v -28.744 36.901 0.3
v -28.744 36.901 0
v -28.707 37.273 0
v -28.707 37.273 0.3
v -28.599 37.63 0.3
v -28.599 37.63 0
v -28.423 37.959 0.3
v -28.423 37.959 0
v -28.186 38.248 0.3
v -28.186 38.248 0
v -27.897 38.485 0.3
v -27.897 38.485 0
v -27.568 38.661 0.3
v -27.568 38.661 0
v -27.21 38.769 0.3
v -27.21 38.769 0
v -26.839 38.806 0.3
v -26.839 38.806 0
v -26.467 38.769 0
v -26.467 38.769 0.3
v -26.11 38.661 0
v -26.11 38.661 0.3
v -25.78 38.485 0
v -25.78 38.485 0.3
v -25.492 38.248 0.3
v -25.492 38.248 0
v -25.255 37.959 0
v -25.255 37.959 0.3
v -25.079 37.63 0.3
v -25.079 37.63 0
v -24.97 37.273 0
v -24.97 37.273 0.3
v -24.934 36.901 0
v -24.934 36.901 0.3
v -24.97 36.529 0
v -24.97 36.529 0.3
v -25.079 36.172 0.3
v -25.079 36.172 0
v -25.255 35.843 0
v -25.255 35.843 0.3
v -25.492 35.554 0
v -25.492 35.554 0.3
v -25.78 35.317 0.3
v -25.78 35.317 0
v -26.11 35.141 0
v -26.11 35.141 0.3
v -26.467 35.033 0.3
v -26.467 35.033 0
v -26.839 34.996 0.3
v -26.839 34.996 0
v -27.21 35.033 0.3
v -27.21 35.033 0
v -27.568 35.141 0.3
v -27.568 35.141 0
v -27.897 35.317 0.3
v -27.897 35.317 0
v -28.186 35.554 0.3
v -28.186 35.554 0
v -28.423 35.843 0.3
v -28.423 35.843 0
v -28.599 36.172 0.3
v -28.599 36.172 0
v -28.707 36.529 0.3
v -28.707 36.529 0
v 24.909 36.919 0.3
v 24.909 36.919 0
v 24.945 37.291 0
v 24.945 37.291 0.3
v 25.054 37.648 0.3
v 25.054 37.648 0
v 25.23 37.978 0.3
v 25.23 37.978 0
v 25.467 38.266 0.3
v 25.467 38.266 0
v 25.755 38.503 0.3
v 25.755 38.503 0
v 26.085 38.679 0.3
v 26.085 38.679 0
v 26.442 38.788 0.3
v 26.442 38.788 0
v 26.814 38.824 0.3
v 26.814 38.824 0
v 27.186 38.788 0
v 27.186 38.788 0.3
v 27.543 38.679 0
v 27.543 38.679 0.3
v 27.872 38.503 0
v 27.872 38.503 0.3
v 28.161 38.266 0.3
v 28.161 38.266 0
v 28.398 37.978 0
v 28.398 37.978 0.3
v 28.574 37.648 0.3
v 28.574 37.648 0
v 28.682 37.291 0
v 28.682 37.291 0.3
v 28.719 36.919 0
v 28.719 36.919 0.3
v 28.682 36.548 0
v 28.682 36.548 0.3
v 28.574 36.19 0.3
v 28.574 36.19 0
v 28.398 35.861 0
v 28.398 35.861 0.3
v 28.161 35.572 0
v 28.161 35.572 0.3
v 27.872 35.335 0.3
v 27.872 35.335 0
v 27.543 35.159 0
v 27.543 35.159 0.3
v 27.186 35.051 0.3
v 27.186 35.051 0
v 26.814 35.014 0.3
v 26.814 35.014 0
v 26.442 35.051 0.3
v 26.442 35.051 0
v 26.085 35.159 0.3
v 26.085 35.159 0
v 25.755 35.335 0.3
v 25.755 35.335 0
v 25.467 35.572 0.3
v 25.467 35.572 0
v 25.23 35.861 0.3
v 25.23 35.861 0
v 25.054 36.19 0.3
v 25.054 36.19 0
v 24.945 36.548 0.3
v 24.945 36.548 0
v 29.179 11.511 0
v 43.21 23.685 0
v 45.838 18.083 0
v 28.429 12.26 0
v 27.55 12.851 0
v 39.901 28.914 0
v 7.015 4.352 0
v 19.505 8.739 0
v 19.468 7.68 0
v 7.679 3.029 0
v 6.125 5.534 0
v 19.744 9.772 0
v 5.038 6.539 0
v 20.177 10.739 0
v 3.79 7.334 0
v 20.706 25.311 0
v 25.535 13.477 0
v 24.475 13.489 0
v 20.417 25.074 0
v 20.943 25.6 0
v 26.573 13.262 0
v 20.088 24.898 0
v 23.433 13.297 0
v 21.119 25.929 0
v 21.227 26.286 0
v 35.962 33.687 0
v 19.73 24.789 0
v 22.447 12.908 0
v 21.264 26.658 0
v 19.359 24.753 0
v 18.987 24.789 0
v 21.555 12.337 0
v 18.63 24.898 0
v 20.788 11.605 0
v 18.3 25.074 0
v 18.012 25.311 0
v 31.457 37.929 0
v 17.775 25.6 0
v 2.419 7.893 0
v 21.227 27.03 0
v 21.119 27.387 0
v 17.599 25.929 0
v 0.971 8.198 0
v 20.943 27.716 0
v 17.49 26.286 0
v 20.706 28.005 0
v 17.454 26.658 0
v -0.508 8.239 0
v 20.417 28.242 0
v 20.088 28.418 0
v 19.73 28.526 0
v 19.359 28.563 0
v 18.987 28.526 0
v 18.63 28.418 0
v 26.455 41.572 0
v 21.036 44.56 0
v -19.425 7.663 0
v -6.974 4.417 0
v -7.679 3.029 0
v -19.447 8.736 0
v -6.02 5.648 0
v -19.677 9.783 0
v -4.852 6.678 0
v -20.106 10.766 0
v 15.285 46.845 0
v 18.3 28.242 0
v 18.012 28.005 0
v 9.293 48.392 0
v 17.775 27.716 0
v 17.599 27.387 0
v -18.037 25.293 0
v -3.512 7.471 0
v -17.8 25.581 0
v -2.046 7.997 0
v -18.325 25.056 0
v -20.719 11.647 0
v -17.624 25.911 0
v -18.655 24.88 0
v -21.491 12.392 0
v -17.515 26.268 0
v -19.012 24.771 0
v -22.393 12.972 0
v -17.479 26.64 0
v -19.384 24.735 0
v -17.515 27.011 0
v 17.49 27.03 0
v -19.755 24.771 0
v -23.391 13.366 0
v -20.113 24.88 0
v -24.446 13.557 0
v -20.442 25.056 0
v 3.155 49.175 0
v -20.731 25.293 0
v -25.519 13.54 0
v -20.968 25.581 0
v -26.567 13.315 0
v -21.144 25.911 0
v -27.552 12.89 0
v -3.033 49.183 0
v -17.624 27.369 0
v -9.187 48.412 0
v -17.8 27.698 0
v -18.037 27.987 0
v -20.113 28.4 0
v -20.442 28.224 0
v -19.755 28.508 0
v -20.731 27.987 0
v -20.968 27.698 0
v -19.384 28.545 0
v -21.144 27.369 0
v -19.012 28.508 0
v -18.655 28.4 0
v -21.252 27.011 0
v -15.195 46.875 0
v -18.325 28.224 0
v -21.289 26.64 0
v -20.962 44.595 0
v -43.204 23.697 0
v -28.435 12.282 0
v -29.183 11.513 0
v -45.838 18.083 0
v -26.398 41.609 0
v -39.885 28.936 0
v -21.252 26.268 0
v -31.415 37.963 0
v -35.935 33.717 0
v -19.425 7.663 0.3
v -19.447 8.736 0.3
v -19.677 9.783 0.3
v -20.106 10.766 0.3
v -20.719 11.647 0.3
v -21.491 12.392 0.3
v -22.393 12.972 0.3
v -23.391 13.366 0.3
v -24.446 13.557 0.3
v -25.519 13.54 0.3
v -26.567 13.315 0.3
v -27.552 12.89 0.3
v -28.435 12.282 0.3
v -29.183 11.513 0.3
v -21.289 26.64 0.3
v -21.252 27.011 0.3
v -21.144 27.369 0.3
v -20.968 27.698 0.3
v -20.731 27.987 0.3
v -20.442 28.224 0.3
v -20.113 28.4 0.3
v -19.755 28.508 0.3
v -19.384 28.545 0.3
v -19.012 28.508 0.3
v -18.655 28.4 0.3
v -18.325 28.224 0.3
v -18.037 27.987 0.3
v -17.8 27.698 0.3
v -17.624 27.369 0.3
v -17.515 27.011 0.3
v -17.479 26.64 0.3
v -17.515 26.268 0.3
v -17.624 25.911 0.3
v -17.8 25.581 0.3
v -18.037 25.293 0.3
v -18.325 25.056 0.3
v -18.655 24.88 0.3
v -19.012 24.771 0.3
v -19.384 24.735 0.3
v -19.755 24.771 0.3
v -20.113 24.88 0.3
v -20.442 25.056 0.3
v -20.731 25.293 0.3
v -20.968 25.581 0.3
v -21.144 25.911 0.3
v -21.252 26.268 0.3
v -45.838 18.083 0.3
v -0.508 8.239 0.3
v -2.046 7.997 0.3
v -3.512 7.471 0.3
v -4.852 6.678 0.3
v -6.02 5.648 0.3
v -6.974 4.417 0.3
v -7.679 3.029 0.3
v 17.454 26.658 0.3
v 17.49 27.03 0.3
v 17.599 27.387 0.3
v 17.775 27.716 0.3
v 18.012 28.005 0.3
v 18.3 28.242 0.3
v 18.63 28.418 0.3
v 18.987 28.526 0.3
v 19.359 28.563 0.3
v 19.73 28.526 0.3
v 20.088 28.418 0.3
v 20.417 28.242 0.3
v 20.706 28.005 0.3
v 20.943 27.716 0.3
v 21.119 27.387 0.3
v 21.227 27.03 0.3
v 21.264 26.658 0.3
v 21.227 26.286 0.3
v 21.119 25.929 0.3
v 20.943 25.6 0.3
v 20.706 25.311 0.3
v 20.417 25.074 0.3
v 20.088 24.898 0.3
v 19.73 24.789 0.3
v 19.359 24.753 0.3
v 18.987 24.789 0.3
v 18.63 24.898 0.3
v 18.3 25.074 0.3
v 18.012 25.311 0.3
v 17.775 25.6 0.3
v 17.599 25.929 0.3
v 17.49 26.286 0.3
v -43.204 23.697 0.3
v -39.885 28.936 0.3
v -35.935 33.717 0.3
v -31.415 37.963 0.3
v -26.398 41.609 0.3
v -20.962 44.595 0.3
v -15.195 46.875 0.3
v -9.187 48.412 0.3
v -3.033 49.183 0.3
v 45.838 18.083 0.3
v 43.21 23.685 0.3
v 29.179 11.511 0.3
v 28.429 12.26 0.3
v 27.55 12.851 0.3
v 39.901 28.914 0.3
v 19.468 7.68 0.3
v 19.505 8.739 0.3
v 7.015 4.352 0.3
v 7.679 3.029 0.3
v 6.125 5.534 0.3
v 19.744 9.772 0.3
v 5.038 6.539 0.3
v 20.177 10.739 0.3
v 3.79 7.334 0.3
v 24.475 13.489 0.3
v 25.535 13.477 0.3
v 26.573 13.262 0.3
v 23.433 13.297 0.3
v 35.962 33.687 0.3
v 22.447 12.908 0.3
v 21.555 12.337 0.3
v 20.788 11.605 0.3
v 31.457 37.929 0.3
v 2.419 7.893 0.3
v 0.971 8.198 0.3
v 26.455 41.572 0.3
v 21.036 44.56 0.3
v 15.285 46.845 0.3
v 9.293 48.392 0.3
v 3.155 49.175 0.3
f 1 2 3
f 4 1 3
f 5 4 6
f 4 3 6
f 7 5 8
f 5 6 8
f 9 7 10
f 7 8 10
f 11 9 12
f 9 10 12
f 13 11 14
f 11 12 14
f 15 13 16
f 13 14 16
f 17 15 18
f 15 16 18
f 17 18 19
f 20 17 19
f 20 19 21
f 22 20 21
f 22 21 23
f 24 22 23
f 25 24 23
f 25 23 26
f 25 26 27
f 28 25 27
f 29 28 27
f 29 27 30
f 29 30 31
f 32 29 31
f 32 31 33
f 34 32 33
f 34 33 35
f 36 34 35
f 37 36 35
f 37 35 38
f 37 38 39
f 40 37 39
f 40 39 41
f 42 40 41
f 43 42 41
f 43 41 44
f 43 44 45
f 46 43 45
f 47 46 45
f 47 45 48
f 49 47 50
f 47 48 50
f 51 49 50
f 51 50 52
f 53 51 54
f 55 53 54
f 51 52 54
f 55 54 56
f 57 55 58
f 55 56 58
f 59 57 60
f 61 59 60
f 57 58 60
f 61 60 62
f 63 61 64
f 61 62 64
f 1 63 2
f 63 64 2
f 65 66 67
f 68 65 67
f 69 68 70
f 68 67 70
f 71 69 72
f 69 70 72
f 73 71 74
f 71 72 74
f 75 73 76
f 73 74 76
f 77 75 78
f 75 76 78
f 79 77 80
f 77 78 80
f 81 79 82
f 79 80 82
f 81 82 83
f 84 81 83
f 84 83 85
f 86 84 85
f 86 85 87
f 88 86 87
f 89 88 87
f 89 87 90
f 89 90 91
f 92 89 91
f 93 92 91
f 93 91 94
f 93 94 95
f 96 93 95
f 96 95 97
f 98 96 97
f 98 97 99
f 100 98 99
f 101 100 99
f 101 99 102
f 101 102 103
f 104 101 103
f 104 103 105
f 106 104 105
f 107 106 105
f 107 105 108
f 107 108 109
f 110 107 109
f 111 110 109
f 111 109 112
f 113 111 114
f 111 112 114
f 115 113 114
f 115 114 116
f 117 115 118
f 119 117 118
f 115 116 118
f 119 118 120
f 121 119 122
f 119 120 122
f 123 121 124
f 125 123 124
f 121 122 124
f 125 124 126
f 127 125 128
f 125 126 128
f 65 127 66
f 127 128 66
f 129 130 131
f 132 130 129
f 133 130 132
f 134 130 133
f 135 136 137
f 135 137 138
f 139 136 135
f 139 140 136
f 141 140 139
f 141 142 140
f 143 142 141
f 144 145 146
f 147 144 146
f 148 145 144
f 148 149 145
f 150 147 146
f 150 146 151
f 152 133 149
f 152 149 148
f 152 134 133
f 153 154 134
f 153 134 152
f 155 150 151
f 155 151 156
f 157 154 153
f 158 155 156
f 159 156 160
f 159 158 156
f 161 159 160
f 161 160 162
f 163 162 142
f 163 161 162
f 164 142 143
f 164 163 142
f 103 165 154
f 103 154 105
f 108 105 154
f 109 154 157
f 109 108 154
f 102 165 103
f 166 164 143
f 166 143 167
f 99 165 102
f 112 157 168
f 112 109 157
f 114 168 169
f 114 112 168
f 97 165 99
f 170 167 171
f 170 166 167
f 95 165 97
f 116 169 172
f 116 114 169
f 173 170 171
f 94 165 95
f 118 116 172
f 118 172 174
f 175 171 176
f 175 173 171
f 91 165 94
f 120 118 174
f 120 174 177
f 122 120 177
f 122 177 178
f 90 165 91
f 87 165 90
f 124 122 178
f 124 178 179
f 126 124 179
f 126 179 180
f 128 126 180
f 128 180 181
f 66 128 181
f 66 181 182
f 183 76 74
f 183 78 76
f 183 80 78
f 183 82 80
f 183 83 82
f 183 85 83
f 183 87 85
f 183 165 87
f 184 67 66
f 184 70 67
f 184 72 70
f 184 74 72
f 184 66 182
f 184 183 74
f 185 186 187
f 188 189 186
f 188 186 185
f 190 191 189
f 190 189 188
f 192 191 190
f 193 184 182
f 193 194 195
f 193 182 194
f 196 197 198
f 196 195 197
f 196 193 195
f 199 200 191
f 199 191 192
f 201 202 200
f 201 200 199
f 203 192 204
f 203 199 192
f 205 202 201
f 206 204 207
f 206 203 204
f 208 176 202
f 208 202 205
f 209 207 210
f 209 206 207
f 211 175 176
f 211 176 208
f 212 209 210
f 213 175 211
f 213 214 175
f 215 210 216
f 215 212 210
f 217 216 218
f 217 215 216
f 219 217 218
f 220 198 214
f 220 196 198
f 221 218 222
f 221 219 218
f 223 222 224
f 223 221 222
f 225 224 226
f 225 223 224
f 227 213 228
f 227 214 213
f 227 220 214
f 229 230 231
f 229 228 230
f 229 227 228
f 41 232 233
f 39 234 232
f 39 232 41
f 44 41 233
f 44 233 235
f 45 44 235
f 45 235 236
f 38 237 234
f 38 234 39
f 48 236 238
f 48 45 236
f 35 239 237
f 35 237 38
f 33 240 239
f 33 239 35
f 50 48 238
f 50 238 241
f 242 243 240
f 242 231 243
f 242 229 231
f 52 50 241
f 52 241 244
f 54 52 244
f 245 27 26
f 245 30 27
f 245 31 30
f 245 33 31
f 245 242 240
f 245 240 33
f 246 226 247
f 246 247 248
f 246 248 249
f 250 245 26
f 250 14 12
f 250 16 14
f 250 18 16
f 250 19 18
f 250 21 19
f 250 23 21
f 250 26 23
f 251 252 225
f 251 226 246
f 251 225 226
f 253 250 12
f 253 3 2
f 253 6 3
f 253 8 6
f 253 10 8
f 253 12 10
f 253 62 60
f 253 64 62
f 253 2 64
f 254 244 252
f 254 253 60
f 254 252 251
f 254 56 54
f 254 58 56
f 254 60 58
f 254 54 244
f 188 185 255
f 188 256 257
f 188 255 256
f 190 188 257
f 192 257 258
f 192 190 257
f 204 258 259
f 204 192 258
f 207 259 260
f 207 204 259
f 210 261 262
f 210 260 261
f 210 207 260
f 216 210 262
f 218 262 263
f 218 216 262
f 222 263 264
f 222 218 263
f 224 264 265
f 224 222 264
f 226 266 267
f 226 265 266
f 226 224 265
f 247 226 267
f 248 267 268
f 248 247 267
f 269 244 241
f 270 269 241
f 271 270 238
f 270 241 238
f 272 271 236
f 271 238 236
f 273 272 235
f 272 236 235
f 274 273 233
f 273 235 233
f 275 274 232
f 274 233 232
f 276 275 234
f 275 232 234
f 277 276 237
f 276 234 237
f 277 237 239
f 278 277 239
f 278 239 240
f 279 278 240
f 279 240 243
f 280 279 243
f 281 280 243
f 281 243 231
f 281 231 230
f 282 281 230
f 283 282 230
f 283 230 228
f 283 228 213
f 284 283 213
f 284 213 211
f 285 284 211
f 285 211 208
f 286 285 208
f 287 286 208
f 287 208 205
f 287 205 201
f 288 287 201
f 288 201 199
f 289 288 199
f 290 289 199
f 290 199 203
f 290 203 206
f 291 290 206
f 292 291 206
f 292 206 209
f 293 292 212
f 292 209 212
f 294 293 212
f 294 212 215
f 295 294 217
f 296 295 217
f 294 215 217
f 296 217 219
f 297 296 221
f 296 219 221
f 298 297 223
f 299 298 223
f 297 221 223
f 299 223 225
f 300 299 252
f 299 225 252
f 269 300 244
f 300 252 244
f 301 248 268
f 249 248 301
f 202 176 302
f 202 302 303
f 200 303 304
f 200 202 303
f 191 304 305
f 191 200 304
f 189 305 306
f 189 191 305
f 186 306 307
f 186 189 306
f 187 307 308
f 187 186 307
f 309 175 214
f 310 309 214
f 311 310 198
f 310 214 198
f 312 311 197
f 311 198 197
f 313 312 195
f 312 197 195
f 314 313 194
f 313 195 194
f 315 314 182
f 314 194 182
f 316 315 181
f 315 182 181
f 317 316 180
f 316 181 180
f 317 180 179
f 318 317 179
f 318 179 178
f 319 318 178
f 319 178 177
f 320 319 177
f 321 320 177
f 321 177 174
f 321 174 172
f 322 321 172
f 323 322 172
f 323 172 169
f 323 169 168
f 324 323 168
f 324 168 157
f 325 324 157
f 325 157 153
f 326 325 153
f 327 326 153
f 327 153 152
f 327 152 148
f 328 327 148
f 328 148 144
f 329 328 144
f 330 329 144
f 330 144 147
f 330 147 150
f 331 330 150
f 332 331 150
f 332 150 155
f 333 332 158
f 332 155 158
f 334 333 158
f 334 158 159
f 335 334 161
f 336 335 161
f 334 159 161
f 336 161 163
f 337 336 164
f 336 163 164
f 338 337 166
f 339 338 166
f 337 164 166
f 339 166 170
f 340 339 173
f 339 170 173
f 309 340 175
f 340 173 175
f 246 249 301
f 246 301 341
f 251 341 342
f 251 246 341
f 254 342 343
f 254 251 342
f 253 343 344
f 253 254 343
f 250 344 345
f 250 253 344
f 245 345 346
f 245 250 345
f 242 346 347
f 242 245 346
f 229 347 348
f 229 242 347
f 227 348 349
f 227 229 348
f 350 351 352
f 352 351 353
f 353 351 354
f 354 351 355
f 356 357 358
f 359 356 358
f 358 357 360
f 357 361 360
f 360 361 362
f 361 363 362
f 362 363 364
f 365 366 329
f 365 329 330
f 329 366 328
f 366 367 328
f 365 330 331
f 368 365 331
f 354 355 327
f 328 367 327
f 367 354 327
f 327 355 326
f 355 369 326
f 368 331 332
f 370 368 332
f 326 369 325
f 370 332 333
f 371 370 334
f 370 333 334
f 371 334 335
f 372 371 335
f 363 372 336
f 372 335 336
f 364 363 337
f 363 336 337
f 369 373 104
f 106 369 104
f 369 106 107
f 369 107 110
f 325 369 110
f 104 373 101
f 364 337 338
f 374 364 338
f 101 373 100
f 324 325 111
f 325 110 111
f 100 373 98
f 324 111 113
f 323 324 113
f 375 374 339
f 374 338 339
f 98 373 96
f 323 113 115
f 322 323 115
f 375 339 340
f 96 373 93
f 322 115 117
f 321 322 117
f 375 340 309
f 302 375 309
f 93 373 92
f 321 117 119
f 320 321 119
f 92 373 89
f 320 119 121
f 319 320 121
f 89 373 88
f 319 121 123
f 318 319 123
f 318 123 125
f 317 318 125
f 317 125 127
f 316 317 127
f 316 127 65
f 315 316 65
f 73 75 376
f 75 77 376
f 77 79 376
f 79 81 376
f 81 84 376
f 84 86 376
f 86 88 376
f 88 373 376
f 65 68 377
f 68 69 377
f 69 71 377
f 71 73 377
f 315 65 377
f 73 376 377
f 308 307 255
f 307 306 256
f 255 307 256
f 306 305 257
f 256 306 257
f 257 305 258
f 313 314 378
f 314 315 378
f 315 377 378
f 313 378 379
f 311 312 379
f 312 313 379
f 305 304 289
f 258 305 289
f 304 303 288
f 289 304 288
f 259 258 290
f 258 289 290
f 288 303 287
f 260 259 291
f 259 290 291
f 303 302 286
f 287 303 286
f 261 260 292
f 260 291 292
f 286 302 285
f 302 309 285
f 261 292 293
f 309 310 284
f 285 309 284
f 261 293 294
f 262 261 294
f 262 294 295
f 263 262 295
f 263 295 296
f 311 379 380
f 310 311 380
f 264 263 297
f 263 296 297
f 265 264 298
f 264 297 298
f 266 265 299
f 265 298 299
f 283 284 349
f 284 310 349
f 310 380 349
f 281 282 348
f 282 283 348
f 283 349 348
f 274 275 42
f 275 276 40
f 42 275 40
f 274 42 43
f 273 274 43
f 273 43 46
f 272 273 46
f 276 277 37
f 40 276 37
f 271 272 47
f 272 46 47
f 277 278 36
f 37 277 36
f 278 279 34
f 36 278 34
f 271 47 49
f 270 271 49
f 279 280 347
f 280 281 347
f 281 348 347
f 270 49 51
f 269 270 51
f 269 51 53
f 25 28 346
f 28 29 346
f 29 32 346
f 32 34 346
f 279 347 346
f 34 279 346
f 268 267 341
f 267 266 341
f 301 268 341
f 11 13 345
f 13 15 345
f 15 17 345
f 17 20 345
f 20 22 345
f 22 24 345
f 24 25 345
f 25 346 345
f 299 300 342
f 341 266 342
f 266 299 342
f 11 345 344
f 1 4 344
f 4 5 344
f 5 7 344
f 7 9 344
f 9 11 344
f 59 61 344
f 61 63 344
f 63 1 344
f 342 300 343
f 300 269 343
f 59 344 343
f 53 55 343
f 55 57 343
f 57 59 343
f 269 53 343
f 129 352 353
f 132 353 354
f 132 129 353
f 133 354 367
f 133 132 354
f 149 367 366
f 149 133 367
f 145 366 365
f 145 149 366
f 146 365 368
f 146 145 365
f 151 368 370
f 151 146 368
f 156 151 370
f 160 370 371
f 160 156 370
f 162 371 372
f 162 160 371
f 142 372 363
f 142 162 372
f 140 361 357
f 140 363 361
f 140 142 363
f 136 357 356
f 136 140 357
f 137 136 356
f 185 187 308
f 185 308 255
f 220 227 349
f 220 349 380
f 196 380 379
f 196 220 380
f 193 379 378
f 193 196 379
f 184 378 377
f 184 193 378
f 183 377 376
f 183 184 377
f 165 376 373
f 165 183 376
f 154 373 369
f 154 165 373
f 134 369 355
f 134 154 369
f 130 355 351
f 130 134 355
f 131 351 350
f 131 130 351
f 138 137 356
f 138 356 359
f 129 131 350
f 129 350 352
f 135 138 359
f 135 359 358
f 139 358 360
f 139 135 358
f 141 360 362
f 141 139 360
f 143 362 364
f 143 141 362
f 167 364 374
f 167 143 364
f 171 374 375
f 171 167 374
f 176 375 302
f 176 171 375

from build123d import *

# Parameters (mm, degrees)
BOSS_EXTRUDE1_DEPTH = 0.3
SKETCH7_R           = 1.905
CUT_EXTRUDE2_DEPTH  = 68.300419328
CUT_EXTRUDE3_DEPTH  = 68.300419328


with BuildPart() as part:
    # Sketch5 → Boss-Extrude1 (new body)
    with BuildSketch(Plane.XY):
        with BuildLine():
            Line((-7.679064705, 3.029354759), (-45.838109317, 18.082917637))
            ThreePointArc((-45.838109317, 18.082917637), (-28.963706092, 39.865121415), (-3.033121883, 49.182561418))
            ThreePointArc((-3.033121883, 49.182561418), (26.454937122, 41.572352326), (45.838109317, 18.082917637))
            Line((45.838109317, 18.082917637), (7.679064705, 3.029354759))
            ThreePointArc((7.679064705, 3.029354759), (4.431883796, 6.964440467), (-0.508126089, 8.239346629))
            ThreePointArc((-0.508126089, 8.239346629), (-4.852167258, 6.678435289), (-7.679064705, 3.029354759))
        make_face()
    extrude(amount=BOSS_EXTRUDE1_DEPTH)

    # Sketch7 → Cut-Extrude2 (cut, through all)
    with BuildSketch(Plane(origin=(0, 0, 0), x_dir=(-1, 0, 0), z_dir=(0, 0, -1))):
        with Locations((-26.813856327, 36.919157691)):
            Circle(SKETCH7_R)
        with Locations((-19.358590444, 26.657864517)):
            Circle(SKETCH7_R)
        with Locations((26.838840816, 36.900999332)):
            Circle(SKETCH7_R)
        with Locations((19.383574933, 26.639706158)):
            Circle(SKETCH7_R)
    extrude(amount=-CUT_EXTRUDE2_DEPTH, mode=Mode.SUBTRACT)

    # Sketch8 → Cut-Extrude3 (cut, through all)
    with BuildSketch(Plane(origin=(0, 0, 0), x_dir=(-1, 0, 0), z_dir=(0, 0, -1))):
        with BuildLine():
            Line((-19.468246955, 7.680131477), (-29.179148849, 11.511036411))
            ThreePointArc((-29.179148849, 11.511036411), (-22.930885785, 13.12620192), (-19.468246955, 7.680131477))
        make_face()
        with BuildLine():
            Line((29.183436436, 11.512727844), (19.425492338, 7.663264983))
            ThreePointArc((19.425492338, 7.663264983), (22.882252084, 13.193140466), (29.183436436, 11.512727844))
        make_face()
    extrude(amount=-CUT_EXTRUDE3_DEPTH, mode=Mode.SUBTRACT)


solid = part.part
